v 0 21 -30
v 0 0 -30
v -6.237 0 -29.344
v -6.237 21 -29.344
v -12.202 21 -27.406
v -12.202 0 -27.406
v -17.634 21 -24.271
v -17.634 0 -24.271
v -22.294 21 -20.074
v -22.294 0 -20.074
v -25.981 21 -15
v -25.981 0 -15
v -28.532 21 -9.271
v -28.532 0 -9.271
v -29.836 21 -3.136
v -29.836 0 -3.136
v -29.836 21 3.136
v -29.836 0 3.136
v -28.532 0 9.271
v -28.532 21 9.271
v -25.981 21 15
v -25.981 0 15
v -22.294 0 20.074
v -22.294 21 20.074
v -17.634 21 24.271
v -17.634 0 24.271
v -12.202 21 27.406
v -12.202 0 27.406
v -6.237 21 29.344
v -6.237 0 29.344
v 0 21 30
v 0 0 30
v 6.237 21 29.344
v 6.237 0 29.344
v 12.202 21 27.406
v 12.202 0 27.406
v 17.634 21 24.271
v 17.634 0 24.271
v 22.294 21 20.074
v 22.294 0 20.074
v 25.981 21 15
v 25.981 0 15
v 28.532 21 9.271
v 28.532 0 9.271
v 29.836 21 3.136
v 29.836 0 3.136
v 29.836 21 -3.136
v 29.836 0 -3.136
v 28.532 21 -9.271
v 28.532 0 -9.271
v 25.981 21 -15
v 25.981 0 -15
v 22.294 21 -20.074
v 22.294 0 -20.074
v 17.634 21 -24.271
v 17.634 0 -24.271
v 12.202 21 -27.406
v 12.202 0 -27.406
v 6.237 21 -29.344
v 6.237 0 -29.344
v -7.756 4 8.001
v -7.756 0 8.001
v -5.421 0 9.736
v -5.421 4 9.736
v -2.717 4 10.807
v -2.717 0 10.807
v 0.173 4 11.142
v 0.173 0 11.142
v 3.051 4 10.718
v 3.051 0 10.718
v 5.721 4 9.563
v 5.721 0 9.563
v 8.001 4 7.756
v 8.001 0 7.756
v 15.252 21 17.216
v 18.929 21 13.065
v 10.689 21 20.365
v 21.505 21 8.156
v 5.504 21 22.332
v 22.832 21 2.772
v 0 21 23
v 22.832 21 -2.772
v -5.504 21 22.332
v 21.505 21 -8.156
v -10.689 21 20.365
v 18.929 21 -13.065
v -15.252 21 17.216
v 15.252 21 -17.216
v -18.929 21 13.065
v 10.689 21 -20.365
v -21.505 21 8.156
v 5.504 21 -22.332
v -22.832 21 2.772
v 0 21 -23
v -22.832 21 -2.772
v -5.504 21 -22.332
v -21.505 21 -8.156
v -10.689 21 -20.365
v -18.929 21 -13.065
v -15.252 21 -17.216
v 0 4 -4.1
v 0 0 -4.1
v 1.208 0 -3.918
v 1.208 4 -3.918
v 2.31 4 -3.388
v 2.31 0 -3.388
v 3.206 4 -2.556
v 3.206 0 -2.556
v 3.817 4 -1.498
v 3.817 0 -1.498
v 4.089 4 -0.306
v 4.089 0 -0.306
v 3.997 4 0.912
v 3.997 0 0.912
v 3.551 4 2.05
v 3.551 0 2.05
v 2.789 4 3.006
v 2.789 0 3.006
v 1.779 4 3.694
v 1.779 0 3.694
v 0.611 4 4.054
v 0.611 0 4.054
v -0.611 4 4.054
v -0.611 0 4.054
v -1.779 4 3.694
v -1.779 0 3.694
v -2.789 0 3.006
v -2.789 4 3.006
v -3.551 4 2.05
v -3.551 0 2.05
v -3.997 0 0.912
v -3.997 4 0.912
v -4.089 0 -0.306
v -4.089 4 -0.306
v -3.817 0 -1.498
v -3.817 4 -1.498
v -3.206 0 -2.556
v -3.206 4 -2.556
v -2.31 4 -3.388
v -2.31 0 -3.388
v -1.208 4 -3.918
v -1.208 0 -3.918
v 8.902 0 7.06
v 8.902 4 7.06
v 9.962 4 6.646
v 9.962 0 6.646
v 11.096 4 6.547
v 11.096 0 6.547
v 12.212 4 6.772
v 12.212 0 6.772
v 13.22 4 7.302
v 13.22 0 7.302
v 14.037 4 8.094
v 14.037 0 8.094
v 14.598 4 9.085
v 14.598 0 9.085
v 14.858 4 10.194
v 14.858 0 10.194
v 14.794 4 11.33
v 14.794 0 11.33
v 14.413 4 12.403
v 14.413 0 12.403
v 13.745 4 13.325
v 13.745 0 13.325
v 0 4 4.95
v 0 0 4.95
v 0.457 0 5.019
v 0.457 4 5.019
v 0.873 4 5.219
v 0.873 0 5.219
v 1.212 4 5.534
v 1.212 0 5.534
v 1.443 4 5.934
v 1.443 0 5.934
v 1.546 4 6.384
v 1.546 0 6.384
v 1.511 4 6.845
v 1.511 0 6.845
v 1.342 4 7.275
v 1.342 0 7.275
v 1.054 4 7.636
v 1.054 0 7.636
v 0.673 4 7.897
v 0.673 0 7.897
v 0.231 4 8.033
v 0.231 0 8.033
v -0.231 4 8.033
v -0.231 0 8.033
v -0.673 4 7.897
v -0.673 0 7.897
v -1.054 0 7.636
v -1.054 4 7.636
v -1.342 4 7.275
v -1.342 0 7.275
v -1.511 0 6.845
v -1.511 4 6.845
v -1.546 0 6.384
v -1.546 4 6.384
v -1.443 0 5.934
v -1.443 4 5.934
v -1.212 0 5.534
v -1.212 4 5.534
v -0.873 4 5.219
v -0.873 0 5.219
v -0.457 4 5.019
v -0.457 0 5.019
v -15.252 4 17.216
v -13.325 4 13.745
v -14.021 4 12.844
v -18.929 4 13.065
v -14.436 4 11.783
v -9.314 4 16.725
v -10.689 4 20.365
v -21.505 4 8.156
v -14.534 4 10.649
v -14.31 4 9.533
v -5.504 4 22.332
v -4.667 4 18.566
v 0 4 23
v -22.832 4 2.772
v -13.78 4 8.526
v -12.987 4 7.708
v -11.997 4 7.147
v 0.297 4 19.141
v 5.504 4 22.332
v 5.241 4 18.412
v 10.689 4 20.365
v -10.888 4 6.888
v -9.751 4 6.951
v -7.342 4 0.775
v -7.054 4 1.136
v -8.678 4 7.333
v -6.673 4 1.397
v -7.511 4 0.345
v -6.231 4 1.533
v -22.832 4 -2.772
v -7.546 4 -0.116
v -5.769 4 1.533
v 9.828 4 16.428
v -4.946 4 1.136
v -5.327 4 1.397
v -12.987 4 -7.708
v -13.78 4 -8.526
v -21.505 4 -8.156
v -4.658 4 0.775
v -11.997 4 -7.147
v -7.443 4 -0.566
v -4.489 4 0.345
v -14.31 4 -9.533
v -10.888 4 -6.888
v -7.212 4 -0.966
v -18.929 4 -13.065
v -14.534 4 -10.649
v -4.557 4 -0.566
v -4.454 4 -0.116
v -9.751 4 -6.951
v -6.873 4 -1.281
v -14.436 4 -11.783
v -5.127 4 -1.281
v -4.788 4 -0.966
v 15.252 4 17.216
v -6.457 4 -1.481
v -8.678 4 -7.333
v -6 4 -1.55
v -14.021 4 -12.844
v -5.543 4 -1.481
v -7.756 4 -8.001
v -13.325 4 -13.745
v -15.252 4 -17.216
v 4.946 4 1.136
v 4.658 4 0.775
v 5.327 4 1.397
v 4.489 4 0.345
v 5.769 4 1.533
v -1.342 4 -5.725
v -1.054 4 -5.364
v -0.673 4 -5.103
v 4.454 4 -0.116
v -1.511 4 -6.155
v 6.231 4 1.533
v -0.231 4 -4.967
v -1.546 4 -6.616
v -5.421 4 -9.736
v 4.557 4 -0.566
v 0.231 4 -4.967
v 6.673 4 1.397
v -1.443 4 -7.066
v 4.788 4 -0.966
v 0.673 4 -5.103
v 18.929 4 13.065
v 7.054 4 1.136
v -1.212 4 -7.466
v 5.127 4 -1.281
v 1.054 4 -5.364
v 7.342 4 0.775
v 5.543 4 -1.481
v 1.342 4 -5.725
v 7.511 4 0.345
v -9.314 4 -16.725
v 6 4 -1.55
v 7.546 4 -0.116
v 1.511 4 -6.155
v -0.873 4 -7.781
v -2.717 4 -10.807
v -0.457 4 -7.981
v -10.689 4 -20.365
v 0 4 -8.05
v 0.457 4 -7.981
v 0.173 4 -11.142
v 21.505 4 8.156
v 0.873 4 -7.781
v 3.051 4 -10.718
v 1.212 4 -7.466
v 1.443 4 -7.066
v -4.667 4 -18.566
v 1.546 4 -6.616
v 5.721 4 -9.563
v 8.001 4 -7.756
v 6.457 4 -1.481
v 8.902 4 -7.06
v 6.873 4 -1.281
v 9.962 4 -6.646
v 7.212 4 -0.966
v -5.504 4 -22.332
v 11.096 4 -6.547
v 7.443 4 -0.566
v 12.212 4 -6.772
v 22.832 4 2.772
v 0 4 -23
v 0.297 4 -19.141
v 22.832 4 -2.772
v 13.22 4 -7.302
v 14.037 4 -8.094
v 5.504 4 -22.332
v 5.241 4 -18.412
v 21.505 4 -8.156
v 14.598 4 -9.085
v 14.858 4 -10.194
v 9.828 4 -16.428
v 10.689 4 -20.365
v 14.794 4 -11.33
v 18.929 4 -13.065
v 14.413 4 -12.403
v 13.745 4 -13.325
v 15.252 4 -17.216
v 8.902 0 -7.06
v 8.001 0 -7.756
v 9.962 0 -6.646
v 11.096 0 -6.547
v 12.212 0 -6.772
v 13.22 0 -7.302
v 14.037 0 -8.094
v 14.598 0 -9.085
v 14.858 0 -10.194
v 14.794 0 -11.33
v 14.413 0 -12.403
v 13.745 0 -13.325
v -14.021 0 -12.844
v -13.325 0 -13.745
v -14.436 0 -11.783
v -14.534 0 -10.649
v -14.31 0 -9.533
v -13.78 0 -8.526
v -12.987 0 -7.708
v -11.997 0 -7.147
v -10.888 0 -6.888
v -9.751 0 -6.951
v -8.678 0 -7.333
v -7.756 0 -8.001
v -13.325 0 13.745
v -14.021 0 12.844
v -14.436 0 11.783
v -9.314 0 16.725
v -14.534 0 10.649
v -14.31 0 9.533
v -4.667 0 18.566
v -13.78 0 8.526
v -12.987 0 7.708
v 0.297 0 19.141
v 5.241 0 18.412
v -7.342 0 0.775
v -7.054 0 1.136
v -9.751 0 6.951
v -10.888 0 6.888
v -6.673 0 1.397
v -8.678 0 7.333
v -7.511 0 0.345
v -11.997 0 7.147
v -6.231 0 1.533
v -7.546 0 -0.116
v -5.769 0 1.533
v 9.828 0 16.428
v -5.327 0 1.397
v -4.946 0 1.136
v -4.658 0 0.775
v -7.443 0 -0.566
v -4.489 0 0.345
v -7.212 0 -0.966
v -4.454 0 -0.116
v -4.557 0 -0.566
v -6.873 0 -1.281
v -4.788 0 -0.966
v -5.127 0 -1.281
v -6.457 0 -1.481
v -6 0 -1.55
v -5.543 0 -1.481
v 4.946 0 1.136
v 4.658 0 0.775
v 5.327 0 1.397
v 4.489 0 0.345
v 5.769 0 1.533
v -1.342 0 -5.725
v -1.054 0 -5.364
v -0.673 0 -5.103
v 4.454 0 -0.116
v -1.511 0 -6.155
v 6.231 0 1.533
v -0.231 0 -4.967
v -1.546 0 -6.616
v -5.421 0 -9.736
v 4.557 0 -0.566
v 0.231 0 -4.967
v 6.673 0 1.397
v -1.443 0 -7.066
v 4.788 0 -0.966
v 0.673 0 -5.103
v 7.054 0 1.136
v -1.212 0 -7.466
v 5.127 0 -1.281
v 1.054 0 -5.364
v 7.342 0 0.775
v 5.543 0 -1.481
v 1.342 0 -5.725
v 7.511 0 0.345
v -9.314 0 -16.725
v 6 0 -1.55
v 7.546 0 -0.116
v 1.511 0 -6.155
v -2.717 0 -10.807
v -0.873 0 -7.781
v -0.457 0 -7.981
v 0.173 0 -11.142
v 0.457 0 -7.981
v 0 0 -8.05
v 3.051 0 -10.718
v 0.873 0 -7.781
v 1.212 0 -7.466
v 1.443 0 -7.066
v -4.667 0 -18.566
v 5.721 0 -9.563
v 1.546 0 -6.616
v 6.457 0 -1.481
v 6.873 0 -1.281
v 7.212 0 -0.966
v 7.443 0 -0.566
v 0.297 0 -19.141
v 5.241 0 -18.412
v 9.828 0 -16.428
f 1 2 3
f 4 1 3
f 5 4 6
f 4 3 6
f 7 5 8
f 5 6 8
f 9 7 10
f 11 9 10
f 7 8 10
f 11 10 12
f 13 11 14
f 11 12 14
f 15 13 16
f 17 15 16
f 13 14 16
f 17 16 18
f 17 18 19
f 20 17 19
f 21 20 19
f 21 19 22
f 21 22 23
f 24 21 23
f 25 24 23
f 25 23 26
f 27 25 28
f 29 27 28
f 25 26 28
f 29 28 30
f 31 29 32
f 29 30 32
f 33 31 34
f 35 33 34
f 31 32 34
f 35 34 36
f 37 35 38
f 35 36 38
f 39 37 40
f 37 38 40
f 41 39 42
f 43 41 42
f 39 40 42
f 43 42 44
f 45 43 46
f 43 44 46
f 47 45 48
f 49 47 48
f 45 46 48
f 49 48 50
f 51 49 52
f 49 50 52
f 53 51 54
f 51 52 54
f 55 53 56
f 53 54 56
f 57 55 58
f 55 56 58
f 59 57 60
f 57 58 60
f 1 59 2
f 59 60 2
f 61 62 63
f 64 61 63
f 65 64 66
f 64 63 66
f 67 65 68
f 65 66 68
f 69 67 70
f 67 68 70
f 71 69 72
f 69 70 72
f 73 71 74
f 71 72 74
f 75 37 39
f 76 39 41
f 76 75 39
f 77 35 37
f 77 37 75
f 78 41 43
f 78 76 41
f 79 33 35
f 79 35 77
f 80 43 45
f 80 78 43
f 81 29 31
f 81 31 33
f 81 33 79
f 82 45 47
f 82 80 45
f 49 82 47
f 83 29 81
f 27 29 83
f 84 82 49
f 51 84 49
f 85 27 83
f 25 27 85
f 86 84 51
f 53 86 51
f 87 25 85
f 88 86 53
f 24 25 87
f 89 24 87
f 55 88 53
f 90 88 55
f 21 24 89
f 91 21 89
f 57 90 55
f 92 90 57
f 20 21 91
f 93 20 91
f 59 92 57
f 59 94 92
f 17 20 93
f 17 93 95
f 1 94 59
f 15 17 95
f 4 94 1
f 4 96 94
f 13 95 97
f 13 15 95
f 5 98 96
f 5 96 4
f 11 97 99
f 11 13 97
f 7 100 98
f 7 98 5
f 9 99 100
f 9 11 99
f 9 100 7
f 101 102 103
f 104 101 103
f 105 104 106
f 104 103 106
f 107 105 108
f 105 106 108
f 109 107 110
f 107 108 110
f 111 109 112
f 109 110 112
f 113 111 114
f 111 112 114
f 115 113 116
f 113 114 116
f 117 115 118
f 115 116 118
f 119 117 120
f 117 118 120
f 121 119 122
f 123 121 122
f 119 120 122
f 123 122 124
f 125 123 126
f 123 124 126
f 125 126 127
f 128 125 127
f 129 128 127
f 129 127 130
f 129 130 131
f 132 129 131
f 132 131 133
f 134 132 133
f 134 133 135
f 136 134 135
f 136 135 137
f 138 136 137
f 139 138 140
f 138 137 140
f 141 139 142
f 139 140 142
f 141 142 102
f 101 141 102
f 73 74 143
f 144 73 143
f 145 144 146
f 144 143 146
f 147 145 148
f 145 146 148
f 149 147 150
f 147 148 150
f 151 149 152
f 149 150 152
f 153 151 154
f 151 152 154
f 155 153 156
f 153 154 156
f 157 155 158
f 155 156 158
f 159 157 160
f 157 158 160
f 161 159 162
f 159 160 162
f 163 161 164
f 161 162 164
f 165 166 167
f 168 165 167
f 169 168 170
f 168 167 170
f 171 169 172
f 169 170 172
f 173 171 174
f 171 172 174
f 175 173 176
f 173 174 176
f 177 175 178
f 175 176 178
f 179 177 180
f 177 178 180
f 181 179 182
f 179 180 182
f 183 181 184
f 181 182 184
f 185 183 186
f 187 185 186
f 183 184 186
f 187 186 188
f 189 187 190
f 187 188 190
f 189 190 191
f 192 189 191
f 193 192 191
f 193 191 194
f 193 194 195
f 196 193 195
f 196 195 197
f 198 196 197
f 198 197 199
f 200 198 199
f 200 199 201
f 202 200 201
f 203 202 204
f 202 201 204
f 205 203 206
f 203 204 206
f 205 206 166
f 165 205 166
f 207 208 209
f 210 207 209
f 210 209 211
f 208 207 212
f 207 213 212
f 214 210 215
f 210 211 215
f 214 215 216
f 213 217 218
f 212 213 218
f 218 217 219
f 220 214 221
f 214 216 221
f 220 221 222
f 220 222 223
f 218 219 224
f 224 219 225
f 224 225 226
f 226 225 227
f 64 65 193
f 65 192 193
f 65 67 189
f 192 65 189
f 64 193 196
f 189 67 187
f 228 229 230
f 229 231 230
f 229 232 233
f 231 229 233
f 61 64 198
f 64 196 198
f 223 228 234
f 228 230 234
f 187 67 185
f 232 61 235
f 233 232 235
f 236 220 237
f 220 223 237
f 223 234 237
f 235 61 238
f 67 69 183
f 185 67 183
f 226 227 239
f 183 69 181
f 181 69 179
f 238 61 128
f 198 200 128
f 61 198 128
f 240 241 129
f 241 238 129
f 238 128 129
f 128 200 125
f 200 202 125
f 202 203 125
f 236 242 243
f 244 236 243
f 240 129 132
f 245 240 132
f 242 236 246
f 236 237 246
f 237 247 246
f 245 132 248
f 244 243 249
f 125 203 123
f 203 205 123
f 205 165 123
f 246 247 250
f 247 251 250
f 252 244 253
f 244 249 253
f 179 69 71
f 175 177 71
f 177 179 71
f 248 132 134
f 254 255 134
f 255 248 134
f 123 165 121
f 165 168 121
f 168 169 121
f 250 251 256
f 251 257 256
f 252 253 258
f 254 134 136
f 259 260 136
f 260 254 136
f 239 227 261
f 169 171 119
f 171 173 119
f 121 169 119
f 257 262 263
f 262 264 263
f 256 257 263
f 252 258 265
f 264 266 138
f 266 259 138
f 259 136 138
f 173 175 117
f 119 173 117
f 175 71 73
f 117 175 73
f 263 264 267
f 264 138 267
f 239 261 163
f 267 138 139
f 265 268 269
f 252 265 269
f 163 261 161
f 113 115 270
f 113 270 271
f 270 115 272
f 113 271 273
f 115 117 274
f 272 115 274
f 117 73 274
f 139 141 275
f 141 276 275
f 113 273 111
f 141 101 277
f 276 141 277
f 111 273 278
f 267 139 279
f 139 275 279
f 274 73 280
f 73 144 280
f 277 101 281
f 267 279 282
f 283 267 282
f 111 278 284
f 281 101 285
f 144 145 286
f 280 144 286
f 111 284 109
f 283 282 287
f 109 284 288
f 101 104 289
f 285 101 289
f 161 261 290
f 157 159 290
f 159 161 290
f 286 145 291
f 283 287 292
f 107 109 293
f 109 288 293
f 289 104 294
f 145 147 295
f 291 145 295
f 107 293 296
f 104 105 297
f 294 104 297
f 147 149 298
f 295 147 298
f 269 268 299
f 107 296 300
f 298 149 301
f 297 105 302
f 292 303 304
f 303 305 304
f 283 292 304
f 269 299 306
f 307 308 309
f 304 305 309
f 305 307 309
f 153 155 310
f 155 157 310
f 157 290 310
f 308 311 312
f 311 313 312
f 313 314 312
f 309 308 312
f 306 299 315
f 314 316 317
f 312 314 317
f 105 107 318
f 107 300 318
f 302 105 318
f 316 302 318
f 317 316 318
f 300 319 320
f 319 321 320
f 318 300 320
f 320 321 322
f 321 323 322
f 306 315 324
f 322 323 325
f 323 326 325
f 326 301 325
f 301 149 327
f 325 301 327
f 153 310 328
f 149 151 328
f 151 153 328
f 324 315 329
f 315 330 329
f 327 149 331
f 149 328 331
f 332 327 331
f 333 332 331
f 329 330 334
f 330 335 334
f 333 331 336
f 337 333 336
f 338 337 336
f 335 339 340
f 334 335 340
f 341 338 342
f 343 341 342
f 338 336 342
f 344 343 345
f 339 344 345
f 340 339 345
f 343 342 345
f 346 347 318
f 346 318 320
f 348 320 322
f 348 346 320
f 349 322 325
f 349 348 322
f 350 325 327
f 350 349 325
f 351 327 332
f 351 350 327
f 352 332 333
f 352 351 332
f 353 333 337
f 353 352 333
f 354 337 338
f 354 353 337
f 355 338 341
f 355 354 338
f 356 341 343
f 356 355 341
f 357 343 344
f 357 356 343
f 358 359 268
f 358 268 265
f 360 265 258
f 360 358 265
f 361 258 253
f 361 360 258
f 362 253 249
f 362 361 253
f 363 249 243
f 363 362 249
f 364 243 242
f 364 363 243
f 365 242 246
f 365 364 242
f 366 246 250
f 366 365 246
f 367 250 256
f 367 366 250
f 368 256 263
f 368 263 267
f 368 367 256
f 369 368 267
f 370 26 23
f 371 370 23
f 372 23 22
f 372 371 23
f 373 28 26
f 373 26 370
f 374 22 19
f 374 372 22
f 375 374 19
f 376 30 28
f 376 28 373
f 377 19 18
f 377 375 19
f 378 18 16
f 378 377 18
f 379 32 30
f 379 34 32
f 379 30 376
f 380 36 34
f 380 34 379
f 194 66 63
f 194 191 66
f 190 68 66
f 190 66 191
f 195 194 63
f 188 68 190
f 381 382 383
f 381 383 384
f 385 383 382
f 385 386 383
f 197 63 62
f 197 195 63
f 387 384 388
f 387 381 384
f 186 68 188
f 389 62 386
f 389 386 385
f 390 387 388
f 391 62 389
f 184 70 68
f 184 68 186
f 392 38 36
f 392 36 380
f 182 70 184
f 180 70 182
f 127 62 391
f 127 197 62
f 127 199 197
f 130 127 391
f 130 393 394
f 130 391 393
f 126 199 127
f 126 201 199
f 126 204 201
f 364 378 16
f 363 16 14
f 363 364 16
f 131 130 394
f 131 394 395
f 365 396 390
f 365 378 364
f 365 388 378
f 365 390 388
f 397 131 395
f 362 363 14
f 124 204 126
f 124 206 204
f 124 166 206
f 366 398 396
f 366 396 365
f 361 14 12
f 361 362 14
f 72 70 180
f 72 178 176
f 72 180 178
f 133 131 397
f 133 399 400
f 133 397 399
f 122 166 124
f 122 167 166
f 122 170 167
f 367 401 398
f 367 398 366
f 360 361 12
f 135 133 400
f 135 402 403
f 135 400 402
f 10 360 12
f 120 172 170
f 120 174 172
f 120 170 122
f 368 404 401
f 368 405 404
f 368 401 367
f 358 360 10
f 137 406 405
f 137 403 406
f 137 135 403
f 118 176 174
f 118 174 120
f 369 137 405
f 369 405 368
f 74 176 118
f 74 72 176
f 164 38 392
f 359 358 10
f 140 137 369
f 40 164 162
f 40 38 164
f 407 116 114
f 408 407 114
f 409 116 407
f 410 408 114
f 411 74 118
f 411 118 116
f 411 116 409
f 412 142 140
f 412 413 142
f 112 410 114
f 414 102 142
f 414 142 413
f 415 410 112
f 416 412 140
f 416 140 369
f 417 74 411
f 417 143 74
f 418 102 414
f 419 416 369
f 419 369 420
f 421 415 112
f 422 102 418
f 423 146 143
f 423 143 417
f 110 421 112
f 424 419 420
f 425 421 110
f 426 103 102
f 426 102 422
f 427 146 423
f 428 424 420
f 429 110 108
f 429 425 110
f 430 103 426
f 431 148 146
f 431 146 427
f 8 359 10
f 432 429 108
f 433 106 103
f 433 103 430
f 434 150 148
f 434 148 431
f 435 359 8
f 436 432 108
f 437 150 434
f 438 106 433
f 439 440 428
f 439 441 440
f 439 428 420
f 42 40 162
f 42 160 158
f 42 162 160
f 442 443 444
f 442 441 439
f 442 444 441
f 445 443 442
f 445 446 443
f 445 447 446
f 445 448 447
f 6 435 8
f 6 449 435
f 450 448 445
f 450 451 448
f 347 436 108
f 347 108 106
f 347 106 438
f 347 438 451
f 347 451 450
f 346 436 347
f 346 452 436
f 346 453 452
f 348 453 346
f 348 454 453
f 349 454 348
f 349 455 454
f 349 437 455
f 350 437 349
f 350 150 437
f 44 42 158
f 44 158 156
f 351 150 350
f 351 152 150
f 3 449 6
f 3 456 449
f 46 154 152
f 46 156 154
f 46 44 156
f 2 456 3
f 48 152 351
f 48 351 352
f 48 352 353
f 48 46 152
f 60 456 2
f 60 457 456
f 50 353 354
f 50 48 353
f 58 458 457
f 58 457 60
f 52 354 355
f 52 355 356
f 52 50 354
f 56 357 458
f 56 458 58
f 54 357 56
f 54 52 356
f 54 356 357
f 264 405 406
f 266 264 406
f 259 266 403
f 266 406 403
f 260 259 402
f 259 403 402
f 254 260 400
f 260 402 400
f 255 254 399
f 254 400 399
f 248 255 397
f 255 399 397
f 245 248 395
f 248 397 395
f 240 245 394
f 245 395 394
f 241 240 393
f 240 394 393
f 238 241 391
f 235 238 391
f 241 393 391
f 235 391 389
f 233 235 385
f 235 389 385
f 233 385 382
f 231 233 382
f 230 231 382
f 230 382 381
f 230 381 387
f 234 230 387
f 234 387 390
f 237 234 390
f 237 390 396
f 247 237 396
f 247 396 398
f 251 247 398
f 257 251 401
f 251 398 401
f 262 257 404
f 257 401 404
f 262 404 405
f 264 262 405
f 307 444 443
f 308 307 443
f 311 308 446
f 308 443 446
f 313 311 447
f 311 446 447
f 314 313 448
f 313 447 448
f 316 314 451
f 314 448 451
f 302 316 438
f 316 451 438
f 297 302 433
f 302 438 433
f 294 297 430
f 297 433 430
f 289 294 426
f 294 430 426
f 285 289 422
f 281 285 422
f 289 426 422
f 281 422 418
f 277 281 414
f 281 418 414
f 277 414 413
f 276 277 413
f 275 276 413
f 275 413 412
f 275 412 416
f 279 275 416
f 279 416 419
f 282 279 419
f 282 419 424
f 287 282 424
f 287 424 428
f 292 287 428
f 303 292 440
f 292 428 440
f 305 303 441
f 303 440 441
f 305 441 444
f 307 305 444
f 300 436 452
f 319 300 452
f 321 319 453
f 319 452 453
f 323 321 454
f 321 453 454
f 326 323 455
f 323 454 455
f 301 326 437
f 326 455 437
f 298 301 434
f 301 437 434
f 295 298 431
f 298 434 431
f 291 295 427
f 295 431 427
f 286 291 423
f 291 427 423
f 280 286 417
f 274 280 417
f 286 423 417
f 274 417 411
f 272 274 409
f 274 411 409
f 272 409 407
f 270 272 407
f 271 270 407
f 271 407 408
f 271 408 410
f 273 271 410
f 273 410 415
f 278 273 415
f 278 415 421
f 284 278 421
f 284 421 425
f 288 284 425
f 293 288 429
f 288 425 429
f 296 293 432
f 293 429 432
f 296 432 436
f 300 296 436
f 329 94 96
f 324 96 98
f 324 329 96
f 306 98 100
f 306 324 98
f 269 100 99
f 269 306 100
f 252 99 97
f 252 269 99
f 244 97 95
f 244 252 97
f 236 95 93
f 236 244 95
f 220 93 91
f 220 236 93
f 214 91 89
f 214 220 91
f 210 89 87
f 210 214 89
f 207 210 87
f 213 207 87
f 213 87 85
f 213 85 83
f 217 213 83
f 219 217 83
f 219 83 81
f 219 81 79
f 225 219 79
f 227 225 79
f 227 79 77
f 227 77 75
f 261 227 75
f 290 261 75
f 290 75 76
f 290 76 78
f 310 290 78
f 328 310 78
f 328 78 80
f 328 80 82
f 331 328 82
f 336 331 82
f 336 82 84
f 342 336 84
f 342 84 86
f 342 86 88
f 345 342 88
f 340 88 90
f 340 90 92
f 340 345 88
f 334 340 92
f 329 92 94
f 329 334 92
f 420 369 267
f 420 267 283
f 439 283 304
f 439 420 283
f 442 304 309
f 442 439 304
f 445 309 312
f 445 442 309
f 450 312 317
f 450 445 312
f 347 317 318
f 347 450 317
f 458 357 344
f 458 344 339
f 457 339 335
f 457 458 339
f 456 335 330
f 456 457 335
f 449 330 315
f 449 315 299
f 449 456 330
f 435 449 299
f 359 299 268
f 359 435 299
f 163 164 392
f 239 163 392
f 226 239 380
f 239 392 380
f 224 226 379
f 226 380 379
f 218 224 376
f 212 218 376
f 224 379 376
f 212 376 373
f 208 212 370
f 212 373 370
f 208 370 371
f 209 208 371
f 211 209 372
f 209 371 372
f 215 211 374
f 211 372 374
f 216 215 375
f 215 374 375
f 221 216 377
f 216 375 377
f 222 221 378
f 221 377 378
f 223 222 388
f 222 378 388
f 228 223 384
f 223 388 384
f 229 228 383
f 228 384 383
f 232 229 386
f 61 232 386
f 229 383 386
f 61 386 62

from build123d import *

# Parameters (mm, degrees)
SKETCH_1_R      = 30
SKETCH_1_R_2    = 23
EXTRUDE_1_DEPTH = 21
SKETCH_2_R      = 23
SKETCH_2_R_2    = 4.1
SKETCH_2_R_3    = 1.55
EXTRUDE_2_DEPTH = 4


with BuildPart() as part:
    # 草图1 → 凸台-拉伸1 (new body)
    with BuildSketch(Plane(origin=(0, 0, 0), x_dir=(1, 0, 0), z_dir=(0, 1, 0))):
        with Locations(Location((0, 0, 0), (0, 0, 90))):
            Circle(SKETCH_1_R)
        with Locations(Location((0, 0, 0), (0, 0, 90))):
            Circle(SKETCH_1_R_2, mode=Mode.SUBTRACT)
    extrude(amount=EXTRUDE_1_DEPTH)

    # 草图2 → 凸台-拉伸2 (add)
    with BuildSketch(Plane.XZ):
        with Locations(Location((0, 0, 0), (0, 0, 270))):
            Circle(SKETCH_2_R)
        with Locations(Location((0, 0, 0), (0, 0, 270))):
            Circle(SKETCH_2_R_2, mode=Mode.SUBTRACT)
        with Locations(Location((6, 0, 0), (0, 0, 270))):
            Circle(SKETCH_2_R_3, mode=Mode.SUBTRACT)
        with Locations(Location((-6, 0, 0), (0, 0, 270))):
            Circle(SKETCH_2_R_3, mode=Mode.SUBTRACT)
        with Locations(Location((0, 6.5, 0), (0, 0, 270))):
            Circle(SKETCH_2_R_3, mode=Mode.SUBTRACT)
        with Locations(Location((0, -6.5, 0), (0, 0, 270))):
            Circle(SKETCH_2_R_3, mode=Mode.SUBTRACT)
        with BuildLine():
            ThreePointArc((13.744660155, 13.324975875), (0.2967616, 19.141123201), (-13.324975875, 13.744660155))
            ThreePointArc((-13.324975875, 13.744660155), (-13.412668503, 8.088485652), (-7.756494001, 8.000793024))
            ThreePointArc((-7.756494001, 8.000793024), (0.172745496, 11.142084508), (8.000793024, 7.756494001))
            ThreePointArc((8.000793024, 7.756494001), (13.656967527, 7.668801373), (13.744660155, 13.324975875))
        make_face(mode=Mode.SUBTRACT)
        with BuildLine():
            ThreePointArc((13.744660155, -13.324975875), (0.2967616, -19.141123201), (-13.324975875, -13.744660155))
            ThreePointArc((-13.324975875, -13.744660155), (-13.412668503, -8.088485652), (-7.756494001, -8.000793024))
            ThreePointArc((-7.756494001, -8.000793024), (0.172745496, -11.142084508), (8.000793024, -7.756494001))
            ThreePointArc((8.000793024, -7.756494001), (13.656967527, -7.668801373), (13.744660155, -13.324975875))
        make_face(mode=Mode.SUBTRACT)
    extrude(amount=-EXTRUDE_2_DEPTH)


solid = part.part
